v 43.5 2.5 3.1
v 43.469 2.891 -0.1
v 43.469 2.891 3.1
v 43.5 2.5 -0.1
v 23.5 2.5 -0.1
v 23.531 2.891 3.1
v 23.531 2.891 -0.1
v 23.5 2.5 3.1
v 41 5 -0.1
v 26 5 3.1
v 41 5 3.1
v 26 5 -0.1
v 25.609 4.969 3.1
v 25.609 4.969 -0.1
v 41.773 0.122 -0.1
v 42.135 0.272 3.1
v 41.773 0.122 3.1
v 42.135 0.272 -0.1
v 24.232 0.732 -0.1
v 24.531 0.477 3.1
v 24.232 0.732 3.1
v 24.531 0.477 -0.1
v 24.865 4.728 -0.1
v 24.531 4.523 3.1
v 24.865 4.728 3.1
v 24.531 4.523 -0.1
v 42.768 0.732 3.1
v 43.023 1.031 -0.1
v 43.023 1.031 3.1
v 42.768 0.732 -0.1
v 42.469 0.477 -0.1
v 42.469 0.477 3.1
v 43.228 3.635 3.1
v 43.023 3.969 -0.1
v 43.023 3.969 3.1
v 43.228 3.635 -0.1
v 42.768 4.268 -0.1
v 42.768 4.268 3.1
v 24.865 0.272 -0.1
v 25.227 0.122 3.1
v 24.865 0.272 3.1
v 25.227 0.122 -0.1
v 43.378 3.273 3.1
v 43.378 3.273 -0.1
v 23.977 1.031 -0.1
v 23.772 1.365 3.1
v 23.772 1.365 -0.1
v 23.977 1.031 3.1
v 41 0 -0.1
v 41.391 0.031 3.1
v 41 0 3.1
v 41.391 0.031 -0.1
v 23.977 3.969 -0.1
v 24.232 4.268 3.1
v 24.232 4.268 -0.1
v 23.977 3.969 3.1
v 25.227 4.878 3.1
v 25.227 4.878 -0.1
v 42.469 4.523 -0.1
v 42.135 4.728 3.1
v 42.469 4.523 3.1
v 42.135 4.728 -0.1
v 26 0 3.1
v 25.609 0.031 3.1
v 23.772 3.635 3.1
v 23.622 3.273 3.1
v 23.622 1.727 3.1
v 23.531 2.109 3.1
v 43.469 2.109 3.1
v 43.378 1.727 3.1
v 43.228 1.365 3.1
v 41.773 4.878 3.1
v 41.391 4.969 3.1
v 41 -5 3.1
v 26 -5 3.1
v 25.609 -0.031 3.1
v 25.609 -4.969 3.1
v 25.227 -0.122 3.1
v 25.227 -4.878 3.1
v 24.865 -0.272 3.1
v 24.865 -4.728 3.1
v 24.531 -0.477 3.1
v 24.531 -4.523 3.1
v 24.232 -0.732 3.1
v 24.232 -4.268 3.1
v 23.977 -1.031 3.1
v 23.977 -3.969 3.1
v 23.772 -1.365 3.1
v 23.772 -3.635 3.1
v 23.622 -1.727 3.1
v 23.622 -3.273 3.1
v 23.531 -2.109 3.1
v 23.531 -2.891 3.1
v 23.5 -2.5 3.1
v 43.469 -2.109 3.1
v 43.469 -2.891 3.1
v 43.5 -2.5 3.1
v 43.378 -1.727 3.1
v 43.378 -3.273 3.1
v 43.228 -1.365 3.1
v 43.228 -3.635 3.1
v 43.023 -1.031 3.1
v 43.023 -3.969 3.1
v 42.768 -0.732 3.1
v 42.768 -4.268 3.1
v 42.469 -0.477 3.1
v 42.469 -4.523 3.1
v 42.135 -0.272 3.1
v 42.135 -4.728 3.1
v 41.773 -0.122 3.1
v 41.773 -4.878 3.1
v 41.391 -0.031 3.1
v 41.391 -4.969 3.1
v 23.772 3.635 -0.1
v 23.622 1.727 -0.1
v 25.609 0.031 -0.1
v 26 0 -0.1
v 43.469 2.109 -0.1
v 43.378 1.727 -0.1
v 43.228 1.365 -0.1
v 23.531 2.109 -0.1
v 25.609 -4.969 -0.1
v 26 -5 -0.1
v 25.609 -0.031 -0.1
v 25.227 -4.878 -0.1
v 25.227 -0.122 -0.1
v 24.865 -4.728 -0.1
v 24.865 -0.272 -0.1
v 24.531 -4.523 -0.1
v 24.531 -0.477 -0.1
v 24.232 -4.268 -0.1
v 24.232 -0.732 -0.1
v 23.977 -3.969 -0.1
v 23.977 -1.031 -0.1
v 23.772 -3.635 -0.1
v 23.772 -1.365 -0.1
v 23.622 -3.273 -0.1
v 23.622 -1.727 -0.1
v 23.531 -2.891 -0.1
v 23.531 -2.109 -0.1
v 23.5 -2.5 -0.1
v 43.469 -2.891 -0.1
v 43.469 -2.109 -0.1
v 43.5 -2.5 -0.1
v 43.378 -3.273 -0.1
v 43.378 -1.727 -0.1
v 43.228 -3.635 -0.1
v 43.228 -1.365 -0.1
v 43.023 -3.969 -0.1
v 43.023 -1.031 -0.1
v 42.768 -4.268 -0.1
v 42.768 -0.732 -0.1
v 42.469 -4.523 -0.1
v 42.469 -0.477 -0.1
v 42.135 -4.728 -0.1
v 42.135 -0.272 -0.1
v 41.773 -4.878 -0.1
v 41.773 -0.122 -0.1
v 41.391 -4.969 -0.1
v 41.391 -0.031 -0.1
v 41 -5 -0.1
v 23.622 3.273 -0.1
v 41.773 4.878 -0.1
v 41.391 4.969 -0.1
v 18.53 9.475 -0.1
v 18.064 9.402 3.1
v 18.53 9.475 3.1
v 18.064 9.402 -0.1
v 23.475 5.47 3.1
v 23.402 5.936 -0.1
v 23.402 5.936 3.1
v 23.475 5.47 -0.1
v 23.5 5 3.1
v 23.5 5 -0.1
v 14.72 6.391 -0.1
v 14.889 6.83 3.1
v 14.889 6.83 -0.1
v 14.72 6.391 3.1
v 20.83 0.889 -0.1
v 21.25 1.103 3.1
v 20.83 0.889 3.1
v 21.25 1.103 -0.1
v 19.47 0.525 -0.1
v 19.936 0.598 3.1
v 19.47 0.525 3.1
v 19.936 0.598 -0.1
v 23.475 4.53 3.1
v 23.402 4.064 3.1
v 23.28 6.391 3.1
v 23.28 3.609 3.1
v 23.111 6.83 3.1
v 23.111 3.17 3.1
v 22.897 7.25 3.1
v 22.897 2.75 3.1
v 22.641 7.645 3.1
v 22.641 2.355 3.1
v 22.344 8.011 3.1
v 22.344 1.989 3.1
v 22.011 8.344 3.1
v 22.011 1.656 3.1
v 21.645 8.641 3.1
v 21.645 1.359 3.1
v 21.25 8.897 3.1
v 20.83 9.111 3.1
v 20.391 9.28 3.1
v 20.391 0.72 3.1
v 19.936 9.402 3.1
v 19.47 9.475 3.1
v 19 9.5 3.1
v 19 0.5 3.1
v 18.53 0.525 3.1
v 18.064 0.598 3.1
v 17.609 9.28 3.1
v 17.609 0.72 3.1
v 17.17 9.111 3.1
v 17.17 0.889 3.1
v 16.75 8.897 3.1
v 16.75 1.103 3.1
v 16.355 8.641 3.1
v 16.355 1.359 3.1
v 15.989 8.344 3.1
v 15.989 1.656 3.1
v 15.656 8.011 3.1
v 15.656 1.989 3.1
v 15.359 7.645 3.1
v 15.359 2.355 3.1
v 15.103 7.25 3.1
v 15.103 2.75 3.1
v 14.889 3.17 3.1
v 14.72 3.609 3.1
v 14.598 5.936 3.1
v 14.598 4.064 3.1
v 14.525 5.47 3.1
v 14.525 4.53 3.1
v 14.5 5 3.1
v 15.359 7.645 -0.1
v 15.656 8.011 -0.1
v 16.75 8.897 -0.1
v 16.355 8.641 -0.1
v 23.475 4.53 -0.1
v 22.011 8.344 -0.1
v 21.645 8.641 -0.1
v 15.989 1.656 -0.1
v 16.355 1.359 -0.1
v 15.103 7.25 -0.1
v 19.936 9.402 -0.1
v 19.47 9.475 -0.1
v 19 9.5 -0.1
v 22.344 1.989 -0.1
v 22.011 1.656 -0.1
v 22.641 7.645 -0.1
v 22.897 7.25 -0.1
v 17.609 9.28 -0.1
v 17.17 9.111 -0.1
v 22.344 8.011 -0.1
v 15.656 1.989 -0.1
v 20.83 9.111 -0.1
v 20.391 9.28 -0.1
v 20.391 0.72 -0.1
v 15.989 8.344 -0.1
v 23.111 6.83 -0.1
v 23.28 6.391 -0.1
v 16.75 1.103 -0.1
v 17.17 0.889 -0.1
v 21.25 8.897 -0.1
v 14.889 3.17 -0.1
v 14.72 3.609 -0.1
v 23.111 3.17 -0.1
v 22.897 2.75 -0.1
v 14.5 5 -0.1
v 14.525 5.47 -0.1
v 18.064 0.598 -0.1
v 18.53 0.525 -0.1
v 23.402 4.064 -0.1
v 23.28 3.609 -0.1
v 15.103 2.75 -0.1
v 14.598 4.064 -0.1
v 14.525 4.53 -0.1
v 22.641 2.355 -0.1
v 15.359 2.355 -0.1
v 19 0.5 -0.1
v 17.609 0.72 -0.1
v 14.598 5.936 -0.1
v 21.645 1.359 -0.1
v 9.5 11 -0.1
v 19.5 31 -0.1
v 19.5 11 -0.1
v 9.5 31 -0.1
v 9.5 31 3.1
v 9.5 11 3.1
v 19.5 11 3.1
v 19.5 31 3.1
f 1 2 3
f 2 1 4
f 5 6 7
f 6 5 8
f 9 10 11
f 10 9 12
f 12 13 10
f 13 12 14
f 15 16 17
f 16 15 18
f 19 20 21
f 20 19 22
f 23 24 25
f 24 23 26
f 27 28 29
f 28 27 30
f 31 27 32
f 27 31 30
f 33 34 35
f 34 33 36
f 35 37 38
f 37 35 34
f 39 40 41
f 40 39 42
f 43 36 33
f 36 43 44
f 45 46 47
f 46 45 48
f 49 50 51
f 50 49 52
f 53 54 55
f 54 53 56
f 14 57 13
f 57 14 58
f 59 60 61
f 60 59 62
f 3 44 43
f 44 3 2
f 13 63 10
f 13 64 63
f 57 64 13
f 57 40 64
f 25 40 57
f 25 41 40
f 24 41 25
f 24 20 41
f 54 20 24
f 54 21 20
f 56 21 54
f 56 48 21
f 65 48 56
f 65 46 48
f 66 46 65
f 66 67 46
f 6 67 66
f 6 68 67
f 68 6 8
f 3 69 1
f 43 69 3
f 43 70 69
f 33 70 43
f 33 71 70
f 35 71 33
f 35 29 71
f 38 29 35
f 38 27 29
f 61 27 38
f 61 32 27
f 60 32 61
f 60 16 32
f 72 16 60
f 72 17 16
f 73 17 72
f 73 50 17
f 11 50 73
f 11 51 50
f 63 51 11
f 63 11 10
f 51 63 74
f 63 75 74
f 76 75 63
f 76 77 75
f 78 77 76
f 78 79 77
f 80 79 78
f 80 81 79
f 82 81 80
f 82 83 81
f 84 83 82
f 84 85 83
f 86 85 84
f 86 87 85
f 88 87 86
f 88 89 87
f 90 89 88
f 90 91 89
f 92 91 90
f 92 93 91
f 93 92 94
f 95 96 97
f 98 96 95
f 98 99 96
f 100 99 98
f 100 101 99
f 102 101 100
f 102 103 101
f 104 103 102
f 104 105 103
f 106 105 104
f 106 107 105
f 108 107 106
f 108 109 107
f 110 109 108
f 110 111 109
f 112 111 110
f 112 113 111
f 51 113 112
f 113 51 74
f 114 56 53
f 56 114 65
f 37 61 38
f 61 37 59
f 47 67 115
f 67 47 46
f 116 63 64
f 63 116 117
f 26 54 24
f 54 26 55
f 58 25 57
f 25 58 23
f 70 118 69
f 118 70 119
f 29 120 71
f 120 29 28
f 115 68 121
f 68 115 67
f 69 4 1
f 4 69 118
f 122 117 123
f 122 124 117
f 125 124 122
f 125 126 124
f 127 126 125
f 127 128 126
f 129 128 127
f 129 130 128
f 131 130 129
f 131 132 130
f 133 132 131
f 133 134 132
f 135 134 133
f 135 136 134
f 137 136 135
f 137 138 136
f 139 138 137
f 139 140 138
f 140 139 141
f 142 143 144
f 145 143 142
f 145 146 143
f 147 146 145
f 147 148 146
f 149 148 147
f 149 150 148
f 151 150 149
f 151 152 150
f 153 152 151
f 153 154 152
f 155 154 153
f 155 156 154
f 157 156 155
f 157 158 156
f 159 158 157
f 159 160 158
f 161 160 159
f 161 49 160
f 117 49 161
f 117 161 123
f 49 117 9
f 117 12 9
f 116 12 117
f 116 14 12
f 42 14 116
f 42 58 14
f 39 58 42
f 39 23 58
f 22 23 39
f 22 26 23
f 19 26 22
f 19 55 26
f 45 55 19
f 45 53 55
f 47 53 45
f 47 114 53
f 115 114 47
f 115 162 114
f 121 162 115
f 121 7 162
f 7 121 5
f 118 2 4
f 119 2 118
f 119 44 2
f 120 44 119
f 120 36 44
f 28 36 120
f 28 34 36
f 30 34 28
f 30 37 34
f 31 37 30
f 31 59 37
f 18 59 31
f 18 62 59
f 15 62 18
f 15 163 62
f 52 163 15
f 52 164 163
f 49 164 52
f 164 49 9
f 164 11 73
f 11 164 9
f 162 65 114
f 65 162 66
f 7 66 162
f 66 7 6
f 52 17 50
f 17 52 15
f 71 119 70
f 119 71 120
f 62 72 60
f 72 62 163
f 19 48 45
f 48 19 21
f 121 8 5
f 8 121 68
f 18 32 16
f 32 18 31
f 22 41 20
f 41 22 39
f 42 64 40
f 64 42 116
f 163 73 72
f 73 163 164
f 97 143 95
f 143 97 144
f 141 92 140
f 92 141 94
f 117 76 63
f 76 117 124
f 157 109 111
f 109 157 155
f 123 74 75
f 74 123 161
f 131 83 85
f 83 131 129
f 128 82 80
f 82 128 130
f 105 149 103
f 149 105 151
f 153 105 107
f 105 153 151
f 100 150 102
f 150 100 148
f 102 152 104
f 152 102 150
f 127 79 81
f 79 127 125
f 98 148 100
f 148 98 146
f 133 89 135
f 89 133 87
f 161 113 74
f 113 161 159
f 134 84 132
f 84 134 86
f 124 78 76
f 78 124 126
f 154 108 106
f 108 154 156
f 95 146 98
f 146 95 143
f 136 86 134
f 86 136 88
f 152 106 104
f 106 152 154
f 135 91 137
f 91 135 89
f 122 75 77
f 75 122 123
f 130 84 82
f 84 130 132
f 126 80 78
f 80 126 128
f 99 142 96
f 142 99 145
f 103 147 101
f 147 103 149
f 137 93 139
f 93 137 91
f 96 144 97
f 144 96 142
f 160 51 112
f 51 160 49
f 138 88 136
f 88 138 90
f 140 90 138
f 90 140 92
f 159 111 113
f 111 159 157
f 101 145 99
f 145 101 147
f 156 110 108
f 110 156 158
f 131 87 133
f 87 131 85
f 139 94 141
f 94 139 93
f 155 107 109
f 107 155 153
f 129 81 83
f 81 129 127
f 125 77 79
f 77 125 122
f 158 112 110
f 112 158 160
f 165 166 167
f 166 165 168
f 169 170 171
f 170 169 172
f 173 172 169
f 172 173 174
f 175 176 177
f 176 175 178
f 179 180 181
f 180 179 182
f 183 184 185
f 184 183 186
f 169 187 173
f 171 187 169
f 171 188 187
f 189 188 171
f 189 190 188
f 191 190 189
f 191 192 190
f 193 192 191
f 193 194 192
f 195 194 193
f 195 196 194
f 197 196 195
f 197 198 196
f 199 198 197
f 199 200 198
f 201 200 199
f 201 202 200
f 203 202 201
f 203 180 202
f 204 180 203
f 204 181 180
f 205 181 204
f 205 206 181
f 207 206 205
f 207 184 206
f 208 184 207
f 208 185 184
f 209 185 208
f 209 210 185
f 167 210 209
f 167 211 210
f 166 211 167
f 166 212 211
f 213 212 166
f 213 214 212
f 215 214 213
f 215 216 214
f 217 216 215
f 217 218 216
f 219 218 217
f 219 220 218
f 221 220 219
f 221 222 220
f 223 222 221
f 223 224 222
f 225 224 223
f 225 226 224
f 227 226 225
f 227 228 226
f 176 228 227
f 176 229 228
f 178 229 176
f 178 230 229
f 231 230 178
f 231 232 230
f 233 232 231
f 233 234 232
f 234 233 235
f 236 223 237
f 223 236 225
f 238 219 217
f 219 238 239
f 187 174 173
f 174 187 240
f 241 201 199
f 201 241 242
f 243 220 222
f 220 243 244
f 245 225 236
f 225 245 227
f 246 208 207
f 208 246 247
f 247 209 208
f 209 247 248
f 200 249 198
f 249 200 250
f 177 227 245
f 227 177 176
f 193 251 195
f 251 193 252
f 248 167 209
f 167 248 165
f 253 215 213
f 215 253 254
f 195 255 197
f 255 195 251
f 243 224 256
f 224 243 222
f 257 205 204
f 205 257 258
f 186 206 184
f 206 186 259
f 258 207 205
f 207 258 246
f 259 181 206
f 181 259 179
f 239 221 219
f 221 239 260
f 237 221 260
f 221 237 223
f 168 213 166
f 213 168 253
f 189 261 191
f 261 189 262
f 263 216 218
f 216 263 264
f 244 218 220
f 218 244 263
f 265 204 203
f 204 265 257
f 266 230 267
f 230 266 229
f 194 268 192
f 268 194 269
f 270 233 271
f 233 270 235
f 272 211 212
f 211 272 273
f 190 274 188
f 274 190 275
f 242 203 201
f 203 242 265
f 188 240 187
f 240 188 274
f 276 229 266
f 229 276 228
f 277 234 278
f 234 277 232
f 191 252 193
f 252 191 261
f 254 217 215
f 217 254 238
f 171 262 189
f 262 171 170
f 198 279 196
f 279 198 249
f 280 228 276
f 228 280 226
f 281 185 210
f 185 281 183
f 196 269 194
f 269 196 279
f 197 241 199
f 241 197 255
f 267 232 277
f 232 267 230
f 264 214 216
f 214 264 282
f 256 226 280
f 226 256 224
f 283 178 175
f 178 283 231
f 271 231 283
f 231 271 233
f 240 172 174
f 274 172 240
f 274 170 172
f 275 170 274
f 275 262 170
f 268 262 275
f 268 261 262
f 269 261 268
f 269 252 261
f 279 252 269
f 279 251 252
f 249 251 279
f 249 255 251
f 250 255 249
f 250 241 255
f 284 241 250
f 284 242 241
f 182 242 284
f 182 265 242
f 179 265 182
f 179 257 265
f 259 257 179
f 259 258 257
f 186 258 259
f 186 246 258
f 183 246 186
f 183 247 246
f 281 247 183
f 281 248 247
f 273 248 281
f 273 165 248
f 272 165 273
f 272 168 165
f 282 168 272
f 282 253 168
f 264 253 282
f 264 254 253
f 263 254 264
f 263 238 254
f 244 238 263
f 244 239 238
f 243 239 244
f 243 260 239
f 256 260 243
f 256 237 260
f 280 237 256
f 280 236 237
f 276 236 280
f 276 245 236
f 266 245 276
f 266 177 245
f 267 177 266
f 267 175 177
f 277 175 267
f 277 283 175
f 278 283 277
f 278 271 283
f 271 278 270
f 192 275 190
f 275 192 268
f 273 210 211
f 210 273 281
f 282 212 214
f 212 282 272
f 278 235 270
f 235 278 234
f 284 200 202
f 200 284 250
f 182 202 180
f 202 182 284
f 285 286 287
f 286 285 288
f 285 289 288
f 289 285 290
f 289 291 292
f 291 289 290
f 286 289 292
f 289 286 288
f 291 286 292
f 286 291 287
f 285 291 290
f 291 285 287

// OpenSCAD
/**
 * Module: Placement modules
 *
 * Author: Karim Aziiev <karim.aziiev@gmail.com>
 * License: GPL-3.0-or-later
 */
include <../parameters.scad>

use <../lib/debug.scad>
use <../lib/functions.scad>
use <../lib/plist.scad>
use <../lib/shapes3d.scad>
use <../lib/slots.scad>
use <../lib/text.scad>
use <../lib/transforms.scad>

function slot_spec_is_valid(spec) =
  plist_is(spec)
  && (!plist_has("specs", spec)
      || slot_specs_are_valid(plist_get("specs", spec, [])));

function slot_specs_are_valid(specs) =
  len([for (v = specs) if (!slot_spec_is_valid(v)) 1]) == 0;

function get_rect_sizes(spec) =
  let (recess_size = plist_get("recess_size", spec, [0, 0]),
       slot_size  = plist_get("slot_size", spec, [0, 0]),
       placeholder_size = plist_get("placeholder_size", spec, [0, 0]))
  [slot_size, recess_size, placeholder_size];

function get_rect_sizes_at(i, spec) =
  [for (v = get_rect_sizes(spec)) with_default(v[i], 0)];

function get_rect_max_size_at(i, spec) =
  max(get_rect_sizes_at(i, spec));

function get_counterbore_size_at(i, spec) =
  let (d = plist_get("d", spec, 0),
       bore_d  = plist_get("bore_d", spec, 0),
       placeholder_size = plist_get("placeholder_size", spec, [0, 0]))
  max([d, bore_d, with_default(placeholder_size[i], 0)]);

function get_four_corner_hole_size_at(i, spec) =
  let (d = plist_get("d", spec, 0),
       bore_d  = plist_get("bore_d", spec, 0),
       effective_dia = max(d, bore_d),
       slot_size = plist_get("slot_size", spec, [0, 0]),
       placeholder_size = plist_get("placeholder_size", spec, [0, 0]))
  max((with_default(slot_size[i], 0)
       + effective_dia),
      with_default(placeholder_size[i], 0));

function get_placeholder_size(spec) =
  let (slot_size = plist_get("slot_size", spec, [0, 0]),
       placeholder_size = plist_get("placeholder_size", spec, [0, 0]))
  [with_default(slot_size[0], with_default(placeholder_size[0], 0)),
   with_default(slot_size[1], with_default(placeholder_size[1], 0))];

function is_nested_spec(spec) =
  plist_has("specs", spec);

function get_nested_specs(spec) =
  plist_get("specs", spec, []);

function get_nested_direction(spec, parent_direction="btt") =
  plist_get("direction", spec, parent_direction);

function should_swap_size(spec) =
  let (rotation = plist_get("rotation", spec, 0),
       flipped = abs(rotation) == 90)
  flipped;

function get_spec_base_size(spec, parent_direction="btt") =
  is_nested_spec(spec)
  ? get_total_size(get_nested_specs(spec),
                   direction=get_nested_direction(spec, parent_direction))
  : let (type = plist_get("type", spec),
         fallback_size = get_placeholder_size(spec))
    type == "rect" || type == "custom"
    ? [get_rect_max_size_at(0, spec),
       get_rect_max_size_at(1, spec)]
    : type == "counterbore"
      ? [get_counterbore_size_at(0, spec),
         get_counterbore_size_at(1, spec)]
      : type == "four_corner_holes"
        ? [get_four_corner_hole_size_at(0, spec),
           get_four_corner_hole_size_at(1, spec)]
        : fallback_size;

function get_size_at(i, spec, parent_direction="btt") =
  get_spec_base_size(spec, parent_direction)[i];

function get_x_size(spec, parent_direction="btt") =
  let (base_size = get_spec_base_size(spec, parent_direction),
       swapped = should_swap_size(spec))
  swapped ? base_size[1] : base_size[0];

function get_y_size(spec, parent_direction="btt") =
  let (base_size = get_spec_base_size(spec, parent_direction),
       swapped = should_swap_size(spec))
  swapped ? base_size[0] : base_size[1];

function get_gap_before(spec) =
  plist_get("gap_before", spec, 0);

function get_gap_after(spec) =
  plist_get("gap_after", spec, 0);

function get_gap_x_offset(spec) =
  plist_get("x_offset", spec, 0);

function get_gap_y_offset(spec) =
  plist_get("y_offset", spec, 0);

function get_y_sizes(specs, parent_direction="btt") =
  [for (v = specs) get_y_size(v, parent_direction)];

function get_x_sizes(specs, parent_direction="btt") =
  [for (v = specs) get_x_size(v, parent_direction)];

function get_gaps_before(specs) =
  [for (v = specs) get_gap_before(v)];

function get_gaps_after(specs) =
  [for (v = specs) get_gap_after(v)];

function get_max_x(specs, parent_direction="btt") =
  len(specs) == 0 ? 0 : max(get_x_sizes(specs, parent_direction));

function get_max_y(specs, parent_direction="btt") =
  len(specs) == 0 ? 0 : max(get_y_sizes(specs, parent_direction));

function get_total_x(specs, parent_direction="btt") =
  len(specs) == 0 ? 0 :
  sum(concat(get_x_sizes(specs, parent_direction),
             get_gaps_before(specs),
             get_gaps_after(specs)));

function get_total_len(specs, direction) =
  len(specs) == 0
  ? 0
  : sum(concat((direction == "ltr"
                || direction == "rtl" ?
                get_x_sizes(specs, direction)
                : get_y_sizes(specs, direction)),
               get_gaps_before(specs),
               get_gaps_after(specs)));

function get_total_size(specs, direction) =
  len(specs) == 0
  ? [0, 0]
  : (direction == "ltr"
     || direction == "rtl")
    ? [sum(concat(get_x_sizes(specs, direction),
                  get_gaps_before(specs),
                  get_gaps_after(specs))),
       get_max_y(specs, direction),]
    : [get_max_x(specs, direction),
       sum(concat(get_y_sizes(specs, direction),
                  get_gaps_before(specs),
                  get_gaps_after(specs)))];

/**
 *
 * Linear layout helper that places a sequence of “slot” items along one axis
 * (vertical or horizontal), with optional gaps, alignment, offsets, rotation,
 * and debug rendering. Items are described by property-lists (“plists”) in
 * `specs`. The module can also act as a layout engine for arbitrary children.
 *
 * Conceptually this is a 1-D layout:
 * - along Y for `btt` / `ttb`
 * - along X for `ltr` / `rtl`
 *
 * Each item is positioned at its running offset (including gaps) and may be
 * aligned within the cross-axis extent (max size among all items).
 *
 * **Parameters**
 * ----------
 * `specs` : list(plist)
 *   List of item specifications. Each spec must be a plist (see “Spec fields”).
 *
 * `direction` : string = "btt"
 *   Layout direction:
 *   - "btt" bottom-to-top (positive Y)
 *   - "ttb" top-to-bottom (negative Y)
 *   - "ltr" left-to-right (positive X)
 *   - "rtl" right-to-left (negative X)
 *
 * `center` : bool = false
 *   When true, centers the whole laid-out group on its primary axis:
 *   - for "btt"/"ttb": centers on Y
 *   - for "ltr"/"rtl": centers on X
 *   (Cross-axis centering is controlled via `align_to_axle` / `align`.)
 *
 * `align_to_axle` : -1|0|1 = 1
 *   Cross-axis anchoring of the *whole group* relative to the origin using the
 *   max cross size:
 *   -  1 aligns the group to the positive side of the cross axis
 *   -  0 no cross-axis shift
 *   - -1 aligns to the negative side
 *
 * `align_on_primary_axle` : -1|0|1 = 0
 *   Primary-axis anchoring of the *whole group* relative to the origin when
 *   `center == false`. This controls whether the layout starts/ends at the
 *   origin (depending on direction):
 *   -  0 no primary-axis shift (default behavior)
 *   -  1 align the group so its “start” edge sits on the origin
 *        ("ltr"/"btt": start at 0; "rtl"/"ttb": start at total size)
 *   - -1 align the group so its “end” edge sits on the origin
 *        ("ltr"/"btt": end at -total size; "rtl"/"ttb": end at 0)
 *
 * `align` : -1|0|1 = 0
 *   Default per-item alignment on the cross-axis within the group envelope:
 *   -  1 align to positive side
 *   -  0 center
 *   - -1 align to negative side
 *   Can be overridden per item via spec field `"align"`.
 *
 * `use_children` : bool = false
 *   If true and children are provided, uses `children()` as the geometry for
 *   each placed item (placeholders). If false, renders builtin item types
 *   (rect / counterbore / four_corner_holes). For `"custom"` specs, children
 *   are used when `use_children==false` as well.
 *
 * `thickness` : number = 3
 *   Z thickness used by builtin slot generators and debug visuals.
 *   (Assumed to be extruded “up” from Z=0; not centered on Z.)
 *
 * `debug` : bool = false
 *   If true, draws index labels at each item position.
 *
 * `show_borders` : bool = false
 *   If true, draws a border box for each item’s computed footprint
 *   (useful to debug sizing / alignment).
 *
 * Special variables set for children
 * ---------------------------------
 * `$spec` : plist
 *   The spec of the current item.
 * `$i` : number
 *   Index of the current item in `specs`.
 * `$custom` : bool
 *   True when the current spec is `"custom"` and builtin rendering is disabled.
 *
 * Spec fields (per item)
 * ----------------------
 * Common fields:
 * - `"type"`: One of `"rect"`, `"counterbore"`, `"four_corner_holes"`, `"custom".`
 * - `"slot_size"` : [x,y] Nominal footprint of the item for layout and (for "rect") geometry.
 * - `"gap_before"` and `"gap_after"` : Spacing inserted before/after this item in the running direction.
 * - `"x_offset"`and `"y_offset"` : number
 *     Additional per-item offset (applied with layout direction sign).
 * - `"rotation"` : degrees (default 0)
 *     Rotation around Z applied to the rendered geometry. Size computation
 *     swaps X/Y when rotation is ±90° to keep layout consistent.
 * - `"align"` : -1|0|1
 *     Overrides the module-level `align` for this item.
 * - `"debug"` : bool,
 * - `"debug_text"` : Plist or string. Optional per-item debug controls (shown when not using children).
 * - `"placeholder_size"` : [x,y], Alternative footprint used for size computation (useful with children).
 *
 * Nested layout fields:
 * - `"specs"` : list(plist). When present, renders a nested `slot_layout` using these specs.
 * - `"direction"` : string. Direction passed to the nested layout (defaults to the parent `direction`).
 * - `"center"`, `"align"`, `"align_to_axle"`, `"align_on_primary_axle"` :
 *     Optional overrides forwarded to the nested layout.
 * - `"use_children"`, `"show_borders"`, `"debug"`, `"thickness"` :
 *     Optional rendering overrides forwarded to the nested layout.
 *
 *
 * `"rect"` fields:
 * - `"corner_rad"`, `"corner_factor"`, `"round_side"`
 * - "`recess_h"`, `"recess_size"`, `"recess_corner_rad"`, `"recess_reverse"`
 *
 * `"counterbore"` fields:
 * - `"d"`, and optional fields `"bore_d"`, `"bore_h"`, `"sink"`, `"bore_reverse".`
 *
 * `""four_corner_holes"` fields:
 * - Same as "counterbore" plus uses "slot_size" for hole pattern extent.
 */

module slot_layout(specs,
                   direction = "btt",
                   center = false,
                   debug = false,
                   align = 0,
                   align_to_axle = 1,
                   align_on_primary_axle = 0,
                   use_children=false,
                   show_borders=false,
                   thickness=3) {

  // was_valid = slot_specs_are_valid(specs);

  // if (!was_valid) {
  //   specs =plist_get("specs", specs);
  //   direction = plist_get("direction", plist,  "btt");
  //   center = plist_get("center", plist,  false);
  //   debug = plist_get("debug", plist,  false);
  //   align = plist_get("align", plist,  0);
  //   align_to_axle = plist_get("align_to_axle", plist,  1);
  //   align_on_primary_axle = plist_get("align_on_primary_axle", plist,  0);
  //   use_children = plist_get("use_children", plist, false);
  //   show_borders = plist_get("show_borders", plist, false);
  // }

  align = with_default(align, 0);
  align_to_axle = with_default(align_to_axle, 1);
  global_debug = debug;

  assert(member(direction, ["btt", "ttb",
                            "ltr", "rtl"]),
         "Invalid direction");

  assert(member(align, [0, 1, -1]),
         str("Invalid align ", align, " should be 1, 0 or -1"));

  assert(member(align_to_axle, [0, 1, -1]),
         str("Invalid align to axle: ", align_to_axle,
             " but should be 1, 0 or -1"));

  assert(slot_specs_are_valid(specs),
         "Provided specs are not list of plists");

  mapped_specs = specs;
  x_sizes = get_x_sizes(mapped_specs, direction);
  y_sizes = get_y_sizes(mapped_specs, direction);
  gaps_before = get_gaps_before(mapped_specs);
  gaps_after = get_gaps_after(mapped_specs);
  max_x_size = get_max_x(mapped_specs, direction);
  max_y_size = get_max_y(mapped_specs, direction);

  is_ltr = direction == "ltr";
  is_btt = direction == "btt";
  is_ttb = direction == "ttb";

  y_axle = is_ttb || is_btt;

  x_axle = !y_axle;

  total_size = get_total_size(specs, direction);
  total_x = total_size[0];
  total_y = total_size[1];

  group_x = y_axle
            ? (max_x_size / 2 * align_to_axle)
            : center
              ? total_x / 2
              : align_on_primary_axle == 1
                ? (is_ltr ? 0 : total_x)
                : align_on_primary_axle == -1
                  ? (is_ltr ? -total_x : 0)
                  : 0;

  group_y = x_axle
            ? (max_y_size / 2 * align_to_axle)
            : center
              ? total_y / 2
              : align_on_primary_axle == 1
                ? (is_btt ? 0 : total_y)
                : align_on_primary_axle == -1
                  ? (is_btt ? -total_y : 0)
                  : 0;

  ratio = (is_ltr || is_btt) ? 1 : -1;

  translate([group_x, group_y, 0]) {
    if (global_debug) {
      translate([y_axle ? max_y_size : 0,
                 x_axle ? max_x_size : 0,
                 thickness + 0.5]) {

        #text_from_plist(str("Total X ", total_x, " , total Y, ", total_y),
                         default_height=0.5);
      }
    }
    for (i = [0 : len(mapped_specs) - 1]) {
      let (spec = specs[i],
           spec_type = plist_get("type", spec),
           nested = is_nested_spec(spec),
           nested_specs = get_nested_specs(spec),
           direction = get_nested_direction(spec, direction),
           debug = plist_get("debug", spec),
           debug_text = plist_get("debug_text", spec),
           prev_y_acc = sum(y_sizes, i),
           prev_x_acc = sum(x_sizes, i),
           prev_gap_after = sum(gaps_after, i),
           prev_gap_before = sum(gaps_before, i),
           curr_gap_before = get_gap_before(spec),
           rotation = plist_get("rotation", spec, 0),
           align_self = plist_get("align", spec, align),
           align_self_x = y_axle ? align_self : 0,
           align_self_y = x_axle ? align_self : 0,
           slot_size = plist_get("slot_size", spec, [0, 0]),
           x_offset = plist_get("x_offset", spec, 0),
           y_offset = plist_get("y_offset", spec, 0),
           curr_x = x_sizes[i],
           curr_y = y_sizes[i],
           gap_acc = sum([prev_gap_after,
                          prev_gap_before,
                          curr_gap_before]),
           x_acc = y_axle ? 0 : ratio * sum([prev_x_acc, gap_acc, curr_x / 2]),
           y_acc = x_axle ? 0 : ratio * sum([prev_y_acc, gap_acc, curr_y / 2]),
           x_align = align_self_x * (max_x_size / 2 - curr_x / 2),
           y_align = align_self_y * (max_y_size / 2 - curr_y / 2),
           final_y = y_acc + y_align + ratio * y_offset,
           final_x = x_acc + x_align + ratio * x_offset) {

        assert(member(align_self, [0, 1, -1]),
               str("'", spec_type, "'", " item at idx ", "'", i,
                   "'", "has invalid align ", align, " should be 1, 0 or -1"));
        translate([final_x,
                   final_y + (align_self_y * (max_y_size / 2 - curr_y / 2)),
                   0]) {
          if (global_debug) {
            let (txt = str(i)) {
              %translate([0, 0, thickness]) {
                translate([0, 0, thickness + 1]) {
                  #text_from_plist(txt);
                }
              }
            }
          }

          if (show_borders) {
            #difference() {
              cuboid(size=[curr_x,
                           curr_y,
                           thickness]);
              translate([0, 0, -0.5]) {
                cuboid(size=[curr_x - 1,
                             curr_y - 1,
                             thickness + 1]);
              }
            }
          }

          $spec = spec;
          $i = i;
          $custom = !use_children && spec_type == "custom";

          rotate([0, 0, rotation]) {

            if (nested) {
              slot_layout(specs=nested_specs,
                          direction=direction,
                          center=plist_get("center", spec, center),
                          debug=plist_get("debug", spec, debug),
                          align=plist_get("align", spec, align),
                          align_to_axle=plist_get("align_to_axle",
                                                  spec,
                                                  align_to_axle),
                          align_on_primary_axle=plist_get("align_on_primary_axle",
                                                          spec,
                                                          align_on_primary_axle),
                          use_children=plist_get("use_children",
                                                 spec,
                                                 use_children),
                          show_borders=plist_get("show_borders",
                                                 spec,
                                                 show_borders),
                          thickness=plist_get("thickness",
                                              spec,
                                              thickness)) {
                children();
              }
            } else if (use_children && $children) {
              children();
            } else {
              if (debug && !is_undef(debug_text)) {
                text_from_plist(debug_text);
              }
              debug_highlight(debug=debug) {
                if (spec_type == "rect") {
                  let (recess_h = plist_get("recess_h", spec, 0),
                       recess_size = plist_get("recess_size", spec, 0),
                       round_side = plist_get("round_side", spec, 0),
                       corner_rad = plist_get("corner_rad", spec),
                       recess_corner_rad = plist_get("recess_corner_rad",
                                                     spec,
                                                     corner_rad),
                       corner_factor = plist_get("corner_factor", spec, 0.3),
                       reverse = plist_get("recess_reverse", spec, false)) {
                    rect_slot(size=[with_default(slot_size[0], 0),
                                    with_default(slot_size[1], 0)],
                              recess_size=recess_size,
                              recess_h=recess_h,
                              h=thickness,
                              r=corner_rad,
                              recess_corner_r=recess_corner_rad,
                              r_factor=corner_factor,
                              side=round_side,
                              reverse=reverse,
                              center=true);
                  }
                } else if (spec_type == "four_corner_holes") {
                  let (d = plist_get("d", spec, 0),
                       bore_h = plist_get("bore_h", spec, 0),
                       bore_d = plist_get("bore_d", spec, 0),
                       sink = plist_get("sink", spec, false),
                       reverse = plist_get("bore_reverse", spec, false)) {
                    four_corner_children(size=[with_default(slot_size[0], 0),
                                               with_default(slot_size[1], 0)],
                                         center=true) {
                      counterbore(d=d,
                                  bore_d=bore_d,
                                  h=thickness,
                                  sink=sink,
                                  bore_h=bore_h,
                                  reverse=reverse);
                    }
                  }
                } else if (spec_type == "counterbore") {
                  let (d = plist_get("d", spec, 0),
                       bore_h = plist_get("bore_h", spec, 0),
                       bore_d = plist_get("bore_d", spec, 0),
                       sink = plist_get("sink", spec, false),
                       reverse = plist_get("bore_reverse", spec, false)) {
                    counterbore(d=d,
                                bore_d=bore_d,
                                sink=sink,
                                h=thickness,
                                bore_h=bore_h,
                                reverse=reverse);
                  }
                } else if ($custom) {
                  children();
                }
              }
            }
          }
        }
      }
    }
  }
}

module slot_grid_rows(nested_specs,
                      center = false,
                      align_to_axle = 1,
                      use_children=false,
                      show_borders=false,
                      direction = "btt", // "btt" (bottom to top, default) or "ttb" (top to bottom)
                      cols_direction = "ltr", // | "ltr" | "rtl",
                      debug = false,
                      align = 1,
                      thickness=3) {
  row_sizes = [for (v = nested_specs)
    get_total_size(v, direction=cols_direction)[1]];

  translate([0, 0, 0]) {
    for (i = [0 : len(nested_specs) - 1]) {
      let (specs = nested_specs[i],
           curr_offset = row_sizes[i],
           y_offset = i > 0 ? sum(row_sizes, i) : 0) {
        translate([0,
                   y_offset * (direction == "btt" ? 1 : -1)
                   + curr_offset * (direction == "btt" ? 1 : -1),
                   0]) {
          slot_layout(specs=specs,
                      direction=cols_direction,
                      debug=debug,
                      align=align,
                      thickness=thickness,
                      center=center,
                      align_to_axle=align_to_axle,
                      use_children=use_children,
                      show_borders=show_borders) {
            children();
          };
        }
      }
    }
  }
}

module slot_grid_cols(nested_specs,
                      center = false,
                      align_to_axle = 1,
                      use_children=false,
                      show_borders=false,
                      direction = "ltr", // "btt" (bottom to top, default) or "ttb" (top to bottom)
                      cols_direction = "btt", // | "ltr" | "rtl",
                      debug = false,
                      align = 1,
                      thickness=3) {
  row_sizes = [for (v = nested_specs)
    get_total_size(v, direction=cols_direction)[0]];

  translate([0, 0, 0]) {
    for (i = [0 : len(nested_specs) - 1]) {
      let (specs = nested_specs[i],
           curr_offset = row_sizes[i],
           x_offset = i > 0 ? sum(row_sizes, i) : 0) {
        translate([x_offset * (direction == "ltr" ? 1 : -1)
                   + curr_offset * (direction == "ltr" ? 1 : -1),
                   0,
                   0]) {
          slot_layout(specs=specs,
                      direction=cols_direction,
                      debug=debug,
                      align=align,
                      thickness=thickness,
                      center=center,
                      align_to_axle=align_to_axle,
                      use_children=use_children,
                      show_borders=show_borders) {
            children();
          }
        }
      }
    }
  }
}

rect_spec_example              = ["type", "rect",
                                  "gap_before", 0,
                                  "gap_after", 0,
                                  "slot_size", [10, 20],
                                  "corner_rad", 0,
                                  "corner_factor", 0.3,
                                  "round_side", "all",
                                  "placeholder_size", [10, 20],
                                  "recess_h", 0.5,
                                  "recess_reverse", false,
                                  "recess_size", [],
                                  "x_offset", 0,
                                  "y_offset", 0];

four_corner_holes_spec_example = ["type", "four_corner_holes",
                                  "gap_before", 0,
                                  "gap_after", 0,
                                  "slot_size", [10, 20],
                                  "d", 3,
                                  "bore_d", 5,
                                  "bore_h", 2,
                                  "sink", false,
                                  "placeholder_size", [10, 20],
                                  "bore_reverse", false,
                                  "x_offset", 0,
                                  "y_offset", 0,];

my_specs = [["type", "rect",
             "gap_before", 0,
             "rotation", 0,
             "slot_size", [10, 20],
             "corner_rad", 0,
             "gap_after", 1,
             "x_offset", 0,
             "y_offset", 0],
            ["specs", [["type", "counterbore",
                        "gap_before", 0,
                        "rotation", 0,
                        "d", 9,
                        "corner_factor", 0.5,
                        "round_side", "all",
                        "x_offset", 0,
                        "y_offset", 0],
                       ["specs", [["type", "rect",
                                   "gap_before", 0,
                                   "rotation", 0,
                                   "slot_size", [20, 5],
                                   "corner_factor", 0.5,
                                   "round_side", "all",
                                   "x_offset", 0,
                                   "y_offset", 0],
                                  ["type", "rect",
                                   "gap_before", 0,
                                   "rotation", 0,
                                   "slot_size", [20, 5],
                                   "corner_factor", 0.5,
                                   "round_side", "all",
                                   "x_offset", 0,
                                   "y_offset", 0]],
                        "direction", "ttb",]],
             "direction", "ltr",
             "align_to_axle", 0,
             "align_on_primary_axle", 0,
             "center", false,
             "gap_before", 0,
             "gap_after", 0,
             "rotation", 0,
             "x_offset", 0,
             "y_offset", 0]];

slot_layout(my_specs,
            direction="ttb",
            align_on_primary_axle=1);
